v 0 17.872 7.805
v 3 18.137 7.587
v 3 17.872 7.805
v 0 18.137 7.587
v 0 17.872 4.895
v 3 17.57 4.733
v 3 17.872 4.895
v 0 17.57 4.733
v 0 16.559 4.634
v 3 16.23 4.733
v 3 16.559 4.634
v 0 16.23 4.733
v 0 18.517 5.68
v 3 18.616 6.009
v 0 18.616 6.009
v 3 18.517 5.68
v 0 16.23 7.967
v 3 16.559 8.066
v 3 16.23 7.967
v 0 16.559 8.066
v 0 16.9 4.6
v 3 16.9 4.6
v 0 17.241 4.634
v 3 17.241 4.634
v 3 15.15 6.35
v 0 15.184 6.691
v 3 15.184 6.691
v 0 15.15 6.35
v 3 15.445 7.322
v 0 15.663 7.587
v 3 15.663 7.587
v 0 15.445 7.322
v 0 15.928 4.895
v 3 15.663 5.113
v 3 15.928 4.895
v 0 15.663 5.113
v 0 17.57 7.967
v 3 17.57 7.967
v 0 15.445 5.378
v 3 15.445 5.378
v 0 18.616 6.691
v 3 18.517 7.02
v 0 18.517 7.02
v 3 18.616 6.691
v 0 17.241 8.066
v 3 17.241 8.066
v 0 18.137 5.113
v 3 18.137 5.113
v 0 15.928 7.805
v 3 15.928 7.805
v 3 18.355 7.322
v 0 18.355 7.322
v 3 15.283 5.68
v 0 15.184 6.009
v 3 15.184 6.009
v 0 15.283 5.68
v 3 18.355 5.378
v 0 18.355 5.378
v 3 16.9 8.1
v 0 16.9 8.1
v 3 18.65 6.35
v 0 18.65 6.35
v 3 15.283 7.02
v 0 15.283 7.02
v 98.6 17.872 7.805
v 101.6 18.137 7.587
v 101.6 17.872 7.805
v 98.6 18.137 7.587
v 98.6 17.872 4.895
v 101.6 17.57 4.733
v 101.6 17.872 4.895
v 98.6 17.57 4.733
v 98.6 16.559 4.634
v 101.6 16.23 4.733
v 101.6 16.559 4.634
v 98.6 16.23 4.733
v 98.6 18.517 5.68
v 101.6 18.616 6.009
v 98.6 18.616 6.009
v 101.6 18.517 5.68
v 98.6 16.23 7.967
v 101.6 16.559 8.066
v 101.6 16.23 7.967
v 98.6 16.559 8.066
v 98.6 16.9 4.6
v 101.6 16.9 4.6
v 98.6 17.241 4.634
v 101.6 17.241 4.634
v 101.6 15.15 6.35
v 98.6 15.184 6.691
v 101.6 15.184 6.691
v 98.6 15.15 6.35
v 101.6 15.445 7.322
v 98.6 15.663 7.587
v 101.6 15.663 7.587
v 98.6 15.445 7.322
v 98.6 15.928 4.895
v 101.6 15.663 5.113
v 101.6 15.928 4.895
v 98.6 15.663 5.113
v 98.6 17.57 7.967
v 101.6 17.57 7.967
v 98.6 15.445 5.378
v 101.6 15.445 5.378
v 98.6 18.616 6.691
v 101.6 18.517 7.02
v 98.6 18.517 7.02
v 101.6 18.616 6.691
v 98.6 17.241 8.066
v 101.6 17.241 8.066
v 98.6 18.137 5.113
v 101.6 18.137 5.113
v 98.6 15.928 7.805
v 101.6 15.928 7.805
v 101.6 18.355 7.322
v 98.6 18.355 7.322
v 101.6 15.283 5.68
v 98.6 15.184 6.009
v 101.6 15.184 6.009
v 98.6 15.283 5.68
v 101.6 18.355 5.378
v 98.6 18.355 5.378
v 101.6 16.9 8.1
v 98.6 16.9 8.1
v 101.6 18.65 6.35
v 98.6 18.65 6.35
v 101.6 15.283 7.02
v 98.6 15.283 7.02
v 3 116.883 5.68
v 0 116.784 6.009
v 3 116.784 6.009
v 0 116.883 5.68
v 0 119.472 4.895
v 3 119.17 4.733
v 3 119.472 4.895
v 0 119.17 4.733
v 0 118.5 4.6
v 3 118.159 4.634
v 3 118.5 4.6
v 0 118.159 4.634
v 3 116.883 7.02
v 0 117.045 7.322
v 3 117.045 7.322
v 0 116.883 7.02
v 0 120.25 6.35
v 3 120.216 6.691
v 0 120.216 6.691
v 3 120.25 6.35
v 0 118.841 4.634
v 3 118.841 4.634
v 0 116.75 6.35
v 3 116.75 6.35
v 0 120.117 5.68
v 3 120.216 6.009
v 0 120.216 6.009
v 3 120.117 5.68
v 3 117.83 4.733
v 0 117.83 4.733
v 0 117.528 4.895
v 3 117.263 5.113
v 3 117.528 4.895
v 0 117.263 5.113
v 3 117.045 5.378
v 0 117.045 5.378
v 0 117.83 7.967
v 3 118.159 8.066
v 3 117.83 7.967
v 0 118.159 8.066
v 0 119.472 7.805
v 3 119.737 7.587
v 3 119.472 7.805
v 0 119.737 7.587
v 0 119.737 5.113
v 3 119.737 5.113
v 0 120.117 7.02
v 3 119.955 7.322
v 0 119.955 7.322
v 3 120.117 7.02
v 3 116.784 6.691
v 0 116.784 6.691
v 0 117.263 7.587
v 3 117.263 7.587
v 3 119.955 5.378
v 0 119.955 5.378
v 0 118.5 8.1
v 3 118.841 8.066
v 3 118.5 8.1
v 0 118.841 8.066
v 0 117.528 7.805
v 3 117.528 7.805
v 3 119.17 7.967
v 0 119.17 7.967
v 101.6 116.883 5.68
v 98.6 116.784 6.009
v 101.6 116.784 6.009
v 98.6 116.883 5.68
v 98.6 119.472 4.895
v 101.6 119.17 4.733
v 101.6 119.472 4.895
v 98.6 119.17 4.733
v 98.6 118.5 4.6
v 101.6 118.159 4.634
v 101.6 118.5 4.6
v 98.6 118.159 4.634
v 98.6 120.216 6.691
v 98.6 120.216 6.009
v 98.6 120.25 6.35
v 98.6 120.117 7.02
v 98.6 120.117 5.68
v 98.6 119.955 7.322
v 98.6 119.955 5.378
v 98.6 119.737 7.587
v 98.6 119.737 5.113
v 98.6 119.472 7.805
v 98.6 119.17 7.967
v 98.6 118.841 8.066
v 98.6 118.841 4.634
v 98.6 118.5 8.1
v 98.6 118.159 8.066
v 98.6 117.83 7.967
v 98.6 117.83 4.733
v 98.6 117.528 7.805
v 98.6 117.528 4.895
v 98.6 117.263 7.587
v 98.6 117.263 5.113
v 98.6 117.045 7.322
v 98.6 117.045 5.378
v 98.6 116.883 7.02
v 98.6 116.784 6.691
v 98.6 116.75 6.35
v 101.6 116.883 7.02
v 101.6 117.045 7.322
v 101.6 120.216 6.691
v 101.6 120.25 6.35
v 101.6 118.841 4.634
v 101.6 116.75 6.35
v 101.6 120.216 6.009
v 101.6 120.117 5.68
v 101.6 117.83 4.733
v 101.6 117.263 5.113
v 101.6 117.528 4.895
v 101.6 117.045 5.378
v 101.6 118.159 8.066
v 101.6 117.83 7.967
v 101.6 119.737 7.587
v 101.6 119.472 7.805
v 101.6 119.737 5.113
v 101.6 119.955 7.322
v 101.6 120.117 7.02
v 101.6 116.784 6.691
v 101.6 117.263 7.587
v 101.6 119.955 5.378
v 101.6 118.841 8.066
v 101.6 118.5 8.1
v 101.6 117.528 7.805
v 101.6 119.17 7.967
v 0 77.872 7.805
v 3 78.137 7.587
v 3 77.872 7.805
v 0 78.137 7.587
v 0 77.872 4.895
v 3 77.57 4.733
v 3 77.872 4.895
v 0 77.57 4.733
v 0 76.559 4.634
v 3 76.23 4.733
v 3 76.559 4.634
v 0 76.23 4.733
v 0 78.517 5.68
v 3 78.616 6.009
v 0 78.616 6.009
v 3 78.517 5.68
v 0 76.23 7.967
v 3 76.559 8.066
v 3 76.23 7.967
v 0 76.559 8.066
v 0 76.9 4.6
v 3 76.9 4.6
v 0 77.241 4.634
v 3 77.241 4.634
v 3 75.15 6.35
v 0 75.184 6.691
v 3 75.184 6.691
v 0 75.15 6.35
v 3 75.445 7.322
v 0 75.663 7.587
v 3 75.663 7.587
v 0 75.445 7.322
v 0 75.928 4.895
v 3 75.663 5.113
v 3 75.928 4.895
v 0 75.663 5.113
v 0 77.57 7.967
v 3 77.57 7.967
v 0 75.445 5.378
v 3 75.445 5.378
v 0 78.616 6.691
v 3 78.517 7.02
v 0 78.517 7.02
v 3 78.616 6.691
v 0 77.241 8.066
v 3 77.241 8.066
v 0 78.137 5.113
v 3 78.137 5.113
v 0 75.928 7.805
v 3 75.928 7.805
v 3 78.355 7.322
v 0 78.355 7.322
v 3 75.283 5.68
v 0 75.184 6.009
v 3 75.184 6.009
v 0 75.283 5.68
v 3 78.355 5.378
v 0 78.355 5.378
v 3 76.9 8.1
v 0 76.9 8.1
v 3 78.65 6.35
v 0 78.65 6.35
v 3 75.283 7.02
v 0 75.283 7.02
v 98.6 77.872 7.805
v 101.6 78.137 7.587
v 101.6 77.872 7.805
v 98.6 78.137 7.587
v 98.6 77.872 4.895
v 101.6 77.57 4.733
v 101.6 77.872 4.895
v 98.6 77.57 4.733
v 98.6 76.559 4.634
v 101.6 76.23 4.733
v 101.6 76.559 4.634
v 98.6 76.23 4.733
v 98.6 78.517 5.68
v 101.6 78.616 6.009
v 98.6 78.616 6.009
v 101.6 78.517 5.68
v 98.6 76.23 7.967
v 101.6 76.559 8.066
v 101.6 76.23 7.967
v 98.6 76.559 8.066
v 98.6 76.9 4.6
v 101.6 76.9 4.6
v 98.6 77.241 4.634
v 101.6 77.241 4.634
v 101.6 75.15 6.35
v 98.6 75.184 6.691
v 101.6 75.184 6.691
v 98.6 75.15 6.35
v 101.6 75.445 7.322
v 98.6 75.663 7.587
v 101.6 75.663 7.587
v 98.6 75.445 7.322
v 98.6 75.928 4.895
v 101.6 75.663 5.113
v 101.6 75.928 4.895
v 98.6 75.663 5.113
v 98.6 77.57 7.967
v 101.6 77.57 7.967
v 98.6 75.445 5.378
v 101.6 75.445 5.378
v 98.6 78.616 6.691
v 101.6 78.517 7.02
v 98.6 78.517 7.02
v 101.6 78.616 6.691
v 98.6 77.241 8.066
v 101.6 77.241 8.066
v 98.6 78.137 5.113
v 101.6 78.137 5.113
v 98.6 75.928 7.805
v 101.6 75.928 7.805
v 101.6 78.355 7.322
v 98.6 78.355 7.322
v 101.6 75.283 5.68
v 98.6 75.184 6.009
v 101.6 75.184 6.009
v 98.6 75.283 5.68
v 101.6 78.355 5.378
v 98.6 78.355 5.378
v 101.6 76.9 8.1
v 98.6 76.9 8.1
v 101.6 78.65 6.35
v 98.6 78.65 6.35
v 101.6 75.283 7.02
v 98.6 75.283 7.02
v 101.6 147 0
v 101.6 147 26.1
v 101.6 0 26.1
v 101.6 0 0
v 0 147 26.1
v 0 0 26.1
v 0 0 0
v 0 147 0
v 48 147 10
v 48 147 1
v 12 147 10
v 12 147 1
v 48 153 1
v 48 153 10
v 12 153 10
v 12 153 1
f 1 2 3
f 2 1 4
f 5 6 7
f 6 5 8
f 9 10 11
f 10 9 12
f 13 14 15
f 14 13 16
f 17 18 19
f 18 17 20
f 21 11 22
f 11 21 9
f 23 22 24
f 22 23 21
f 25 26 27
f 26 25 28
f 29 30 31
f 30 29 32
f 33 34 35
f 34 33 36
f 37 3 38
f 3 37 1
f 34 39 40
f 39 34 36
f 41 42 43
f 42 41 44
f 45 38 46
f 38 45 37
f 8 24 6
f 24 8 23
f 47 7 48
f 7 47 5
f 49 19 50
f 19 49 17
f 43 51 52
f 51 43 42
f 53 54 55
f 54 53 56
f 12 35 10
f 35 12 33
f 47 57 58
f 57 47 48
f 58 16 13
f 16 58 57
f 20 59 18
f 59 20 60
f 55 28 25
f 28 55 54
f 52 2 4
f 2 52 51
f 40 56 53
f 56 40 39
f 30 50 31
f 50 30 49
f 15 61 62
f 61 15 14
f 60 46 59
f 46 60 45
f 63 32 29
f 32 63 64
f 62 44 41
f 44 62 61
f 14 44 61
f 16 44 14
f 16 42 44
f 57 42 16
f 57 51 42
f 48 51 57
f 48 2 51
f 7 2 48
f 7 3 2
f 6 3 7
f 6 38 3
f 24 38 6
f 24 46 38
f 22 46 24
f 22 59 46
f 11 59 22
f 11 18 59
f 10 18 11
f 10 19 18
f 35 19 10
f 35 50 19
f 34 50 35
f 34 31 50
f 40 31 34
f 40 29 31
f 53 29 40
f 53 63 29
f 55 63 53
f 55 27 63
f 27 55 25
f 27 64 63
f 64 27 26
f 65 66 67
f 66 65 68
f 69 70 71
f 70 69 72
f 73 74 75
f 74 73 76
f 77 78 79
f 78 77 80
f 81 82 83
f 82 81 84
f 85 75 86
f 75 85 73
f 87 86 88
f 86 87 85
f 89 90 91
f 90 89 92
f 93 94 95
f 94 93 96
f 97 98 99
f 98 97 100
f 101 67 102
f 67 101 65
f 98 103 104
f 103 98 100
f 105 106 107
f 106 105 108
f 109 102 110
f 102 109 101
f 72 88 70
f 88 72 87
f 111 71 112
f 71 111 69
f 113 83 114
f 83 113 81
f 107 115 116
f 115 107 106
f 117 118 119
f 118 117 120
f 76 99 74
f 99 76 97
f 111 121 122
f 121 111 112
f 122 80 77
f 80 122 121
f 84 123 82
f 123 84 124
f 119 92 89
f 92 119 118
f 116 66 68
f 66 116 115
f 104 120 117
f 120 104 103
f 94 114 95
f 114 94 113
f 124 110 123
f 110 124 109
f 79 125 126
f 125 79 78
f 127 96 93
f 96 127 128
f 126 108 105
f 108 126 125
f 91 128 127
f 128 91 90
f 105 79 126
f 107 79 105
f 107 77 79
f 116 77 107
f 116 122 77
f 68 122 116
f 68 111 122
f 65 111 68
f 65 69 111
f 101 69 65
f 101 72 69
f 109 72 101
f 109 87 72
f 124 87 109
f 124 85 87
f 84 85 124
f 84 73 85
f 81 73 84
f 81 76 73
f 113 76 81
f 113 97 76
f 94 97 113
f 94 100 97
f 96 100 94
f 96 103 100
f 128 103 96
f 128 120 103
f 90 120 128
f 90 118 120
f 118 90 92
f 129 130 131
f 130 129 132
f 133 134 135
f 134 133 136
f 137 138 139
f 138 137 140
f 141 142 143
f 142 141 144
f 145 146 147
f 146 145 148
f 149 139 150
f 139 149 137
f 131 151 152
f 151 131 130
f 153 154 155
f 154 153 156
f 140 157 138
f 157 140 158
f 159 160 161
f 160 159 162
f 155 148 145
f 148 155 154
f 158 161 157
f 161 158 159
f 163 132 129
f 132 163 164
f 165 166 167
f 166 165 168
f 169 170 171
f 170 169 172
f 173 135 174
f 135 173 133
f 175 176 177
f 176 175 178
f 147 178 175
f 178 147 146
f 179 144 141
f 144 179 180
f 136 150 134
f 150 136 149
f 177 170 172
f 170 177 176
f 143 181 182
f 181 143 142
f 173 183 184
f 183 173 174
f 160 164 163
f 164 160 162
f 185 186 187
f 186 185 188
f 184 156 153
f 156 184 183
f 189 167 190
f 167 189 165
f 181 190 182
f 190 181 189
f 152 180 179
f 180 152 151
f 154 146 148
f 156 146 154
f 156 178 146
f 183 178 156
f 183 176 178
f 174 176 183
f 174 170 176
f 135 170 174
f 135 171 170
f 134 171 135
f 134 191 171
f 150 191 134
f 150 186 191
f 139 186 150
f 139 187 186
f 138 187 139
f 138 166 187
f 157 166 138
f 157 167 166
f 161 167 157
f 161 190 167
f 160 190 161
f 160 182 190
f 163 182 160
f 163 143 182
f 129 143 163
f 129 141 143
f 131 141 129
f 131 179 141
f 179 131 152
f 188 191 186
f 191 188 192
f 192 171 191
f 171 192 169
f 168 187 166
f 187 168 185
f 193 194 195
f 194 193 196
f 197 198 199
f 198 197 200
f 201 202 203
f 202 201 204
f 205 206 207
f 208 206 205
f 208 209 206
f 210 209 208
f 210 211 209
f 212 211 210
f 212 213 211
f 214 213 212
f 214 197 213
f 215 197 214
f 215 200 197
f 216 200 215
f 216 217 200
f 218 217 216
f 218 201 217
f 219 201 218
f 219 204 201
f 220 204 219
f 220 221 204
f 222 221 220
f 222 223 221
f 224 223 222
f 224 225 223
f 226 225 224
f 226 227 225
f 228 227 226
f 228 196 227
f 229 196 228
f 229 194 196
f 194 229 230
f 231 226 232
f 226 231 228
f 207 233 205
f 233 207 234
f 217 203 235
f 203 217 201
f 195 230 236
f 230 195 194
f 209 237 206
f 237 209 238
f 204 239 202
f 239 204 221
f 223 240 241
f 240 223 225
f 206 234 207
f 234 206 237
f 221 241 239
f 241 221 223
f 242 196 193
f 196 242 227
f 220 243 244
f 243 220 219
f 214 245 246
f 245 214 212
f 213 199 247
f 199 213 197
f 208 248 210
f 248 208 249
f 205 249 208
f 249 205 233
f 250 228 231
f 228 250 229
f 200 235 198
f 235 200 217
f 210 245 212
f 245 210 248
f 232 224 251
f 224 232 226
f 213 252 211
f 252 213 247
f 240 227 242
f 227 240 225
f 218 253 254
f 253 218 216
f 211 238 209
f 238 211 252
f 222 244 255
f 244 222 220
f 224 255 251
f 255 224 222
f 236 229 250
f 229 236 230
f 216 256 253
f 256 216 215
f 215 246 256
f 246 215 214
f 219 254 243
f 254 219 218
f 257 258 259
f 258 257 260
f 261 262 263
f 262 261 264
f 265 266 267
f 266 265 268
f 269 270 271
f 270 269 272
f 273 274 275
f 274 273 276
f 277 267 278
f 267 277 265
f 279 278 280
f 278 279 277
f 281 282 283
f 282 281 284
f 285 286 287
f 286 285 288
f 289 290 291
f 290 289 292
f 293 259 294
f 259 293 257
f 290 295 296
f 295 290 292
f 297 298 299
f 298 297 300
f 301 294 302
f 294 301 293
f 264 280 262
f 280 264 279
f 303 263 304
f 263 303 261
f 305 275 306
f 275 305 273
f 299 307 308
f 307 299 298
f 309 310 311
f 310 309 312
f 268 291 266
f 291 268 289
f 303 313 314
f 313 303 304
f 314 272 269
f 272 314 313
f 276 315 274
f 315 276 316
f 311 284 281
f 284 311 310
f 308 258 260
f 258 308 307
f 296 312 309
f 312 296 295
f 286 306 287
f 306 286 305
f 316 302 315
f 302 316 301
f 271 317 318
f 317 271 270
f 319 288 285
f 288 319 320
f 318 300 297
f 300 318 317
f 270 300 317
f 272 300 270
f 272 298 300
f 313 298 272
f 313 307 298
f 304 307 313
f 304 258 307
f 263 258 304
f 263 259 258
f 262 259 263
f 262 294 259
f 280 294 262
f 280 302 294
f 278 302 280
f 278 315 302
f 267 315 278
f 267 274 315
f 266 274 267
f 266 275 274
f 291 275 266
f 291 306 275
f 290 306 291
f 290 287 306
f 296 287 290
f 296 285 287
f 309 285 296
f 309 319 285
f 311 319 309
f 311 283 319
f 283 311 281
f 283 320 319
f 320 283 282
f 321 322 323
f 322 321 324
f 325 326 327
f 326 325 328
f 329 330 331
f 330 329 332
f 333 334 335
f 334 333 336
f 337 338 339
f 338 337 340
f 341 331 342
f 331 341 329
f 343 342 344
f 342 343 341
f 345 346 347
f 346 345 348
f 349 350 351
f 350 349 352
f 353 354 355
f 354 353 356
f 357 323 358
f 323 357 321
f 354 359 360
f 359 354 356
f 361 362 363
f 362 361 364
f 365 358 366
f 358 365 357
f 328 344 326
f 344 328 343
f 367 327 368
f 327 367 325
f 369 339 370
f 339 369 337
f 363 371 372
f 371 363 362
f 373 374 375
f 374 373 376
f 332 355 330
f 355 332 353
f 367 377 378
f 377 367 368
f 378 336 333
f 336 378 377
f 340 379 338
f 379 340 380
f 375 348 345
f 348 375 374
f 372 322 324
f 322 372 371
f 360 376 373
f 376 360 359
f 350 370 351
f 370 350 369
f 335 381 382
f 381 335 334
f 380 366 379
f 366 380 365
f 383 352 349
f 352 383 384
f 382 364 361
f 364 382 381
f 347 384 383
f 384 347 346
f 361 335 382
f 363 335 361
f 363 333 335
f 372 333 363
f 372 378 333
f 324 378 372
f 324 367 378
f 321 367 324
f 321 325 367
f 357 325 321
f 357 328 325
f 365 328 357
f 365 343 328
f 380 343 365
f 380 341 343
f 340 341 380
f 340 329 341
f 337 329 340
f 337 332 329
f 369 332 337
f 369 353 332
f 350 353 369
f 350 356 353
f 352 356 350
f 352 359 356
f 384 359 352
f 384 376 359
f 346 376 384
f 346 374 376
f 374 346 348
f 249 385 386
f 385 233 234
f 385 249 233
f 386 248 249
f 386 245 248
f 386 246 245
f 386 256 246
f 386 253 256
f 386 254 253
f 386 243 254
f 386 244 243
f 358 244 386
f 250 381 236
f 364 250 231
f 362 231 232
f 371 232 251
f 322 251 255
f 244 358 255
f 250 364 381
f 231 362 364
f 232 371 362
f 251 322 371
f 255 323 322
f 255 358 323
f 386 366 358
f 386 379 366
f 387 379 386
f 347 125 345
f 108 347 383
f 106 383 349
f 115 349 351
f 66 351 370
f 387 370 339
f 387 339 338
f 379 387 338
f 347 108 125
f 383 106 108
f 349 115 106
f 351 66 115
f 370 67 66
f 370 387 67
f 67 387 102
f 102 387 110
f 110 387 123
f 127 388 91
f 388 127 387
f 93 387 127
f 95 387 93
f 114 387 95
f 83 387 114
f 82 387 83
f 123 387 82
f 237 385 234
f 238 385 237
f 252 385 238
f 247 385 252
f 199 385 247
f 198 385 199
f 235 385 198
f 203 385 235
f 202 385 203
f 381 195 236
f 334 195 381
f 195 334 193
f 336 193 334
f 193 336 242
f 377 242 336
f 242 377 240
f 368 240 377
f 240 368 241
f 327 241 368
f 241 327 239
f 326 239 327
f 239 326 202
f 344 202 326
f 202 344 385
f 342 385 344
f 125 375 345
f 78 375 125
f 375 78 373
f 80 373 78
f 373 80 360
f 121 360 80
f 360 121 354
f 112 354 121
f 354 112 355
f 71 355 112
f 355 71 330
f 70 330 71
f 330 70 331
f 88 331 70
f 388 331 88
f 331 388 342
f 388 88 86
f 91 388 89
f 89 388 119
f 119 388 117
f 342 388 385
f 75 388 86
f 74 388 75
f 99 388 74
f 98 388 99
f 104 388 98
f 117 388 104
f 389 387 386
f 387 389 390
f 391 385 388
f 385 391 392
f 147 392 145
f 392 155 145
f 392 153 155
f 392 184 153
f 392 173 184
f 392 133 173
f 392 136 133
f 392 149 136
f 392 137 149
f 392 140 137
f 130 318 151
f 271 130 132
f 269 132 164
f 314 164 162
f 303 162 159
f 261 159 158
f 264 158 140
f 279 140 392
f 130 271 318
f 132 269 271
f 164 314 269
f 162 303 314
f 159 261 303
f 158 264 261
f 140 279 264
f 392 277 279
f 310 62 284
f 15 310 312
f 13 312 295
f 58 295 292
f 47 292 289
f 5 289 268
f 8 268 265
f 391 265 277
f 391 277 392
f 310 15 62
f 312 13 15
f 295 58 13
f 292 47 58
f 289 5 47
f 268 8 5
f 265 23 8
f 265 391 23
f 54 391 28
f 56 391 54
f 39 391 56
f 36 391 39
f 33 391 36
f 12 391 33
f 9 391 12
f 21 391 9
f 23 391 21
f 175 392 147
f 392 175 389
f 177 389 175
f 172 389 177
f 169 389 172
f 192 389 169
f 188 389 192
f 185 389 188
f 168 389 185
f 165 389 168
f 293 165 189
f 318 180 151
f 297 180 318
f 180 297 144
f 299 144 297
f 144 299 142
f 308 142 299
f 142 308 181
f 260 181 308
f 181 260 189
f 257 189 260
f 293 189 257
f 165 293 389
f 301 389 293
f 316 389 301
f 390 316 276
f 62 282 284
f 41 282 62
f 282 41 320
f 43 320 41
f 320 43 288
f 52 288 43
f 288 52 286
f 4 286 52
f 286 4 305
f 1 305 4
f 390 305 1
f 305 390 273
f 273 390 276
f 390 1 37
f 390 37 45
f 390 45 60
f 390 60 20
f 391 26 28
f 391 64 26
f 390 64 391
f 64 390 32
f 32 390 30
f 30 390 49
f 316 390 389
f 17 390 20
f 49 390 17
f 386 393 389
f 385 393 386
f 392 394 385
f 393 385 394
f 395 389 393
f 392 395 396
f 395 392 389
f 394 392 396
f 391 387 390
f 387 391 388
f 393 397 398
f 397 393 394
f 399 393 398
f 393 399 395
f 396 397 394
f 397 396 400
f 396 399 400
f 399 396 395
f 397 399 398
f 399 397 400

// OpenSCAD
// hdd35.scad
// Reference model of a 3.5" hard drive (SFF-8300 form factor). This is the
// GROUND TRUTH the drive carrier and rails are designed around.
//
// Drive's own axes (as it lies flat, label up):
//   X = width (101.6). Y = length; Y=0 is the FRONT end (no connectors),
//   +Y runs toward the SATA connectors. Z = thickness; Z=0 is the BASE
//   (PCB side), the label is on the top cover at Z = hdd_h.
//
// Side mounting holes (6-32 UNC) are on the two long side faces (X=0 and
// X=hdd_w). Only the outer pair is used: Western Digital's 2018 white paper
// "3.5-inch Form Factor Mounting Screw Locations and Depths" says the middle
// hole is legacy and missing on some high-capacity drives. Positions are the
// SFF-8300 values. SFF gives them from the CONNECTOR end (28.5 and 130.1);
// v1 had them from the front, and the test-fit drive stuck out the back.
//
// Preview:  openscad -o hdd_iso.png --render --imgsize=1000,800 \
//             --colorscheme=Tomorrow hdd35.scad

$fn = 32;

/* ---------- SFF-8300 nominal ---------- */
hdd_l = 147.0;           // max length
hdd_w = 101.6;
hdd_h = 26.1;            // max height
hdd_side_hole_y  = [16.9, 118.5];  // from the front end; 101.6 apart
hdd_side_hole_y_legacy = 76.9;     // middle hole, not on every drive
hdd_side_hole_z  = 6.35; // above the base
hdd_tap_d        = 3.5;  // 6-32 UNC major diameter (modelled as a plain hole)
hdd_tap_depth    = 3.0;  // SFF-8300 only guarantees 3.02 mm screw penetration

// SATA connectors on the back end, for clearance checks only.
sata_x0 = 12;  sata_w = 36;  sata_h = 9;  sata_z0 = 1;

module hdd35(legacy_hole = false) {
    ys = legacy_hole ? concat(hdd_side_hole_y, [hdd_side_hole_y_legacy])
                     : hdd_side_hole_y;
    difference() {
        cube([hdd_w, hdd_l, hdd_h]);
        for (y = ys, x = [0, hdd_w])
            translate([x, y, hdd_side_hole_z])
                rotate([0, 90, 0])
                    cylinder(d = hdd_tap_d, h = 2 * hdd_tap_depth, center = true);
    }
    // connector block, sticking out behind the drive
    translate([sata_x0, hdd_l, sata_z0]) cube([sata_w, 6, sata_h]);
}

// Demo when opened directly; files that include this set hdd_lib_only = true.
if (is_undef(hdd_lib_only)) hdd35(legacy_hole = true);
